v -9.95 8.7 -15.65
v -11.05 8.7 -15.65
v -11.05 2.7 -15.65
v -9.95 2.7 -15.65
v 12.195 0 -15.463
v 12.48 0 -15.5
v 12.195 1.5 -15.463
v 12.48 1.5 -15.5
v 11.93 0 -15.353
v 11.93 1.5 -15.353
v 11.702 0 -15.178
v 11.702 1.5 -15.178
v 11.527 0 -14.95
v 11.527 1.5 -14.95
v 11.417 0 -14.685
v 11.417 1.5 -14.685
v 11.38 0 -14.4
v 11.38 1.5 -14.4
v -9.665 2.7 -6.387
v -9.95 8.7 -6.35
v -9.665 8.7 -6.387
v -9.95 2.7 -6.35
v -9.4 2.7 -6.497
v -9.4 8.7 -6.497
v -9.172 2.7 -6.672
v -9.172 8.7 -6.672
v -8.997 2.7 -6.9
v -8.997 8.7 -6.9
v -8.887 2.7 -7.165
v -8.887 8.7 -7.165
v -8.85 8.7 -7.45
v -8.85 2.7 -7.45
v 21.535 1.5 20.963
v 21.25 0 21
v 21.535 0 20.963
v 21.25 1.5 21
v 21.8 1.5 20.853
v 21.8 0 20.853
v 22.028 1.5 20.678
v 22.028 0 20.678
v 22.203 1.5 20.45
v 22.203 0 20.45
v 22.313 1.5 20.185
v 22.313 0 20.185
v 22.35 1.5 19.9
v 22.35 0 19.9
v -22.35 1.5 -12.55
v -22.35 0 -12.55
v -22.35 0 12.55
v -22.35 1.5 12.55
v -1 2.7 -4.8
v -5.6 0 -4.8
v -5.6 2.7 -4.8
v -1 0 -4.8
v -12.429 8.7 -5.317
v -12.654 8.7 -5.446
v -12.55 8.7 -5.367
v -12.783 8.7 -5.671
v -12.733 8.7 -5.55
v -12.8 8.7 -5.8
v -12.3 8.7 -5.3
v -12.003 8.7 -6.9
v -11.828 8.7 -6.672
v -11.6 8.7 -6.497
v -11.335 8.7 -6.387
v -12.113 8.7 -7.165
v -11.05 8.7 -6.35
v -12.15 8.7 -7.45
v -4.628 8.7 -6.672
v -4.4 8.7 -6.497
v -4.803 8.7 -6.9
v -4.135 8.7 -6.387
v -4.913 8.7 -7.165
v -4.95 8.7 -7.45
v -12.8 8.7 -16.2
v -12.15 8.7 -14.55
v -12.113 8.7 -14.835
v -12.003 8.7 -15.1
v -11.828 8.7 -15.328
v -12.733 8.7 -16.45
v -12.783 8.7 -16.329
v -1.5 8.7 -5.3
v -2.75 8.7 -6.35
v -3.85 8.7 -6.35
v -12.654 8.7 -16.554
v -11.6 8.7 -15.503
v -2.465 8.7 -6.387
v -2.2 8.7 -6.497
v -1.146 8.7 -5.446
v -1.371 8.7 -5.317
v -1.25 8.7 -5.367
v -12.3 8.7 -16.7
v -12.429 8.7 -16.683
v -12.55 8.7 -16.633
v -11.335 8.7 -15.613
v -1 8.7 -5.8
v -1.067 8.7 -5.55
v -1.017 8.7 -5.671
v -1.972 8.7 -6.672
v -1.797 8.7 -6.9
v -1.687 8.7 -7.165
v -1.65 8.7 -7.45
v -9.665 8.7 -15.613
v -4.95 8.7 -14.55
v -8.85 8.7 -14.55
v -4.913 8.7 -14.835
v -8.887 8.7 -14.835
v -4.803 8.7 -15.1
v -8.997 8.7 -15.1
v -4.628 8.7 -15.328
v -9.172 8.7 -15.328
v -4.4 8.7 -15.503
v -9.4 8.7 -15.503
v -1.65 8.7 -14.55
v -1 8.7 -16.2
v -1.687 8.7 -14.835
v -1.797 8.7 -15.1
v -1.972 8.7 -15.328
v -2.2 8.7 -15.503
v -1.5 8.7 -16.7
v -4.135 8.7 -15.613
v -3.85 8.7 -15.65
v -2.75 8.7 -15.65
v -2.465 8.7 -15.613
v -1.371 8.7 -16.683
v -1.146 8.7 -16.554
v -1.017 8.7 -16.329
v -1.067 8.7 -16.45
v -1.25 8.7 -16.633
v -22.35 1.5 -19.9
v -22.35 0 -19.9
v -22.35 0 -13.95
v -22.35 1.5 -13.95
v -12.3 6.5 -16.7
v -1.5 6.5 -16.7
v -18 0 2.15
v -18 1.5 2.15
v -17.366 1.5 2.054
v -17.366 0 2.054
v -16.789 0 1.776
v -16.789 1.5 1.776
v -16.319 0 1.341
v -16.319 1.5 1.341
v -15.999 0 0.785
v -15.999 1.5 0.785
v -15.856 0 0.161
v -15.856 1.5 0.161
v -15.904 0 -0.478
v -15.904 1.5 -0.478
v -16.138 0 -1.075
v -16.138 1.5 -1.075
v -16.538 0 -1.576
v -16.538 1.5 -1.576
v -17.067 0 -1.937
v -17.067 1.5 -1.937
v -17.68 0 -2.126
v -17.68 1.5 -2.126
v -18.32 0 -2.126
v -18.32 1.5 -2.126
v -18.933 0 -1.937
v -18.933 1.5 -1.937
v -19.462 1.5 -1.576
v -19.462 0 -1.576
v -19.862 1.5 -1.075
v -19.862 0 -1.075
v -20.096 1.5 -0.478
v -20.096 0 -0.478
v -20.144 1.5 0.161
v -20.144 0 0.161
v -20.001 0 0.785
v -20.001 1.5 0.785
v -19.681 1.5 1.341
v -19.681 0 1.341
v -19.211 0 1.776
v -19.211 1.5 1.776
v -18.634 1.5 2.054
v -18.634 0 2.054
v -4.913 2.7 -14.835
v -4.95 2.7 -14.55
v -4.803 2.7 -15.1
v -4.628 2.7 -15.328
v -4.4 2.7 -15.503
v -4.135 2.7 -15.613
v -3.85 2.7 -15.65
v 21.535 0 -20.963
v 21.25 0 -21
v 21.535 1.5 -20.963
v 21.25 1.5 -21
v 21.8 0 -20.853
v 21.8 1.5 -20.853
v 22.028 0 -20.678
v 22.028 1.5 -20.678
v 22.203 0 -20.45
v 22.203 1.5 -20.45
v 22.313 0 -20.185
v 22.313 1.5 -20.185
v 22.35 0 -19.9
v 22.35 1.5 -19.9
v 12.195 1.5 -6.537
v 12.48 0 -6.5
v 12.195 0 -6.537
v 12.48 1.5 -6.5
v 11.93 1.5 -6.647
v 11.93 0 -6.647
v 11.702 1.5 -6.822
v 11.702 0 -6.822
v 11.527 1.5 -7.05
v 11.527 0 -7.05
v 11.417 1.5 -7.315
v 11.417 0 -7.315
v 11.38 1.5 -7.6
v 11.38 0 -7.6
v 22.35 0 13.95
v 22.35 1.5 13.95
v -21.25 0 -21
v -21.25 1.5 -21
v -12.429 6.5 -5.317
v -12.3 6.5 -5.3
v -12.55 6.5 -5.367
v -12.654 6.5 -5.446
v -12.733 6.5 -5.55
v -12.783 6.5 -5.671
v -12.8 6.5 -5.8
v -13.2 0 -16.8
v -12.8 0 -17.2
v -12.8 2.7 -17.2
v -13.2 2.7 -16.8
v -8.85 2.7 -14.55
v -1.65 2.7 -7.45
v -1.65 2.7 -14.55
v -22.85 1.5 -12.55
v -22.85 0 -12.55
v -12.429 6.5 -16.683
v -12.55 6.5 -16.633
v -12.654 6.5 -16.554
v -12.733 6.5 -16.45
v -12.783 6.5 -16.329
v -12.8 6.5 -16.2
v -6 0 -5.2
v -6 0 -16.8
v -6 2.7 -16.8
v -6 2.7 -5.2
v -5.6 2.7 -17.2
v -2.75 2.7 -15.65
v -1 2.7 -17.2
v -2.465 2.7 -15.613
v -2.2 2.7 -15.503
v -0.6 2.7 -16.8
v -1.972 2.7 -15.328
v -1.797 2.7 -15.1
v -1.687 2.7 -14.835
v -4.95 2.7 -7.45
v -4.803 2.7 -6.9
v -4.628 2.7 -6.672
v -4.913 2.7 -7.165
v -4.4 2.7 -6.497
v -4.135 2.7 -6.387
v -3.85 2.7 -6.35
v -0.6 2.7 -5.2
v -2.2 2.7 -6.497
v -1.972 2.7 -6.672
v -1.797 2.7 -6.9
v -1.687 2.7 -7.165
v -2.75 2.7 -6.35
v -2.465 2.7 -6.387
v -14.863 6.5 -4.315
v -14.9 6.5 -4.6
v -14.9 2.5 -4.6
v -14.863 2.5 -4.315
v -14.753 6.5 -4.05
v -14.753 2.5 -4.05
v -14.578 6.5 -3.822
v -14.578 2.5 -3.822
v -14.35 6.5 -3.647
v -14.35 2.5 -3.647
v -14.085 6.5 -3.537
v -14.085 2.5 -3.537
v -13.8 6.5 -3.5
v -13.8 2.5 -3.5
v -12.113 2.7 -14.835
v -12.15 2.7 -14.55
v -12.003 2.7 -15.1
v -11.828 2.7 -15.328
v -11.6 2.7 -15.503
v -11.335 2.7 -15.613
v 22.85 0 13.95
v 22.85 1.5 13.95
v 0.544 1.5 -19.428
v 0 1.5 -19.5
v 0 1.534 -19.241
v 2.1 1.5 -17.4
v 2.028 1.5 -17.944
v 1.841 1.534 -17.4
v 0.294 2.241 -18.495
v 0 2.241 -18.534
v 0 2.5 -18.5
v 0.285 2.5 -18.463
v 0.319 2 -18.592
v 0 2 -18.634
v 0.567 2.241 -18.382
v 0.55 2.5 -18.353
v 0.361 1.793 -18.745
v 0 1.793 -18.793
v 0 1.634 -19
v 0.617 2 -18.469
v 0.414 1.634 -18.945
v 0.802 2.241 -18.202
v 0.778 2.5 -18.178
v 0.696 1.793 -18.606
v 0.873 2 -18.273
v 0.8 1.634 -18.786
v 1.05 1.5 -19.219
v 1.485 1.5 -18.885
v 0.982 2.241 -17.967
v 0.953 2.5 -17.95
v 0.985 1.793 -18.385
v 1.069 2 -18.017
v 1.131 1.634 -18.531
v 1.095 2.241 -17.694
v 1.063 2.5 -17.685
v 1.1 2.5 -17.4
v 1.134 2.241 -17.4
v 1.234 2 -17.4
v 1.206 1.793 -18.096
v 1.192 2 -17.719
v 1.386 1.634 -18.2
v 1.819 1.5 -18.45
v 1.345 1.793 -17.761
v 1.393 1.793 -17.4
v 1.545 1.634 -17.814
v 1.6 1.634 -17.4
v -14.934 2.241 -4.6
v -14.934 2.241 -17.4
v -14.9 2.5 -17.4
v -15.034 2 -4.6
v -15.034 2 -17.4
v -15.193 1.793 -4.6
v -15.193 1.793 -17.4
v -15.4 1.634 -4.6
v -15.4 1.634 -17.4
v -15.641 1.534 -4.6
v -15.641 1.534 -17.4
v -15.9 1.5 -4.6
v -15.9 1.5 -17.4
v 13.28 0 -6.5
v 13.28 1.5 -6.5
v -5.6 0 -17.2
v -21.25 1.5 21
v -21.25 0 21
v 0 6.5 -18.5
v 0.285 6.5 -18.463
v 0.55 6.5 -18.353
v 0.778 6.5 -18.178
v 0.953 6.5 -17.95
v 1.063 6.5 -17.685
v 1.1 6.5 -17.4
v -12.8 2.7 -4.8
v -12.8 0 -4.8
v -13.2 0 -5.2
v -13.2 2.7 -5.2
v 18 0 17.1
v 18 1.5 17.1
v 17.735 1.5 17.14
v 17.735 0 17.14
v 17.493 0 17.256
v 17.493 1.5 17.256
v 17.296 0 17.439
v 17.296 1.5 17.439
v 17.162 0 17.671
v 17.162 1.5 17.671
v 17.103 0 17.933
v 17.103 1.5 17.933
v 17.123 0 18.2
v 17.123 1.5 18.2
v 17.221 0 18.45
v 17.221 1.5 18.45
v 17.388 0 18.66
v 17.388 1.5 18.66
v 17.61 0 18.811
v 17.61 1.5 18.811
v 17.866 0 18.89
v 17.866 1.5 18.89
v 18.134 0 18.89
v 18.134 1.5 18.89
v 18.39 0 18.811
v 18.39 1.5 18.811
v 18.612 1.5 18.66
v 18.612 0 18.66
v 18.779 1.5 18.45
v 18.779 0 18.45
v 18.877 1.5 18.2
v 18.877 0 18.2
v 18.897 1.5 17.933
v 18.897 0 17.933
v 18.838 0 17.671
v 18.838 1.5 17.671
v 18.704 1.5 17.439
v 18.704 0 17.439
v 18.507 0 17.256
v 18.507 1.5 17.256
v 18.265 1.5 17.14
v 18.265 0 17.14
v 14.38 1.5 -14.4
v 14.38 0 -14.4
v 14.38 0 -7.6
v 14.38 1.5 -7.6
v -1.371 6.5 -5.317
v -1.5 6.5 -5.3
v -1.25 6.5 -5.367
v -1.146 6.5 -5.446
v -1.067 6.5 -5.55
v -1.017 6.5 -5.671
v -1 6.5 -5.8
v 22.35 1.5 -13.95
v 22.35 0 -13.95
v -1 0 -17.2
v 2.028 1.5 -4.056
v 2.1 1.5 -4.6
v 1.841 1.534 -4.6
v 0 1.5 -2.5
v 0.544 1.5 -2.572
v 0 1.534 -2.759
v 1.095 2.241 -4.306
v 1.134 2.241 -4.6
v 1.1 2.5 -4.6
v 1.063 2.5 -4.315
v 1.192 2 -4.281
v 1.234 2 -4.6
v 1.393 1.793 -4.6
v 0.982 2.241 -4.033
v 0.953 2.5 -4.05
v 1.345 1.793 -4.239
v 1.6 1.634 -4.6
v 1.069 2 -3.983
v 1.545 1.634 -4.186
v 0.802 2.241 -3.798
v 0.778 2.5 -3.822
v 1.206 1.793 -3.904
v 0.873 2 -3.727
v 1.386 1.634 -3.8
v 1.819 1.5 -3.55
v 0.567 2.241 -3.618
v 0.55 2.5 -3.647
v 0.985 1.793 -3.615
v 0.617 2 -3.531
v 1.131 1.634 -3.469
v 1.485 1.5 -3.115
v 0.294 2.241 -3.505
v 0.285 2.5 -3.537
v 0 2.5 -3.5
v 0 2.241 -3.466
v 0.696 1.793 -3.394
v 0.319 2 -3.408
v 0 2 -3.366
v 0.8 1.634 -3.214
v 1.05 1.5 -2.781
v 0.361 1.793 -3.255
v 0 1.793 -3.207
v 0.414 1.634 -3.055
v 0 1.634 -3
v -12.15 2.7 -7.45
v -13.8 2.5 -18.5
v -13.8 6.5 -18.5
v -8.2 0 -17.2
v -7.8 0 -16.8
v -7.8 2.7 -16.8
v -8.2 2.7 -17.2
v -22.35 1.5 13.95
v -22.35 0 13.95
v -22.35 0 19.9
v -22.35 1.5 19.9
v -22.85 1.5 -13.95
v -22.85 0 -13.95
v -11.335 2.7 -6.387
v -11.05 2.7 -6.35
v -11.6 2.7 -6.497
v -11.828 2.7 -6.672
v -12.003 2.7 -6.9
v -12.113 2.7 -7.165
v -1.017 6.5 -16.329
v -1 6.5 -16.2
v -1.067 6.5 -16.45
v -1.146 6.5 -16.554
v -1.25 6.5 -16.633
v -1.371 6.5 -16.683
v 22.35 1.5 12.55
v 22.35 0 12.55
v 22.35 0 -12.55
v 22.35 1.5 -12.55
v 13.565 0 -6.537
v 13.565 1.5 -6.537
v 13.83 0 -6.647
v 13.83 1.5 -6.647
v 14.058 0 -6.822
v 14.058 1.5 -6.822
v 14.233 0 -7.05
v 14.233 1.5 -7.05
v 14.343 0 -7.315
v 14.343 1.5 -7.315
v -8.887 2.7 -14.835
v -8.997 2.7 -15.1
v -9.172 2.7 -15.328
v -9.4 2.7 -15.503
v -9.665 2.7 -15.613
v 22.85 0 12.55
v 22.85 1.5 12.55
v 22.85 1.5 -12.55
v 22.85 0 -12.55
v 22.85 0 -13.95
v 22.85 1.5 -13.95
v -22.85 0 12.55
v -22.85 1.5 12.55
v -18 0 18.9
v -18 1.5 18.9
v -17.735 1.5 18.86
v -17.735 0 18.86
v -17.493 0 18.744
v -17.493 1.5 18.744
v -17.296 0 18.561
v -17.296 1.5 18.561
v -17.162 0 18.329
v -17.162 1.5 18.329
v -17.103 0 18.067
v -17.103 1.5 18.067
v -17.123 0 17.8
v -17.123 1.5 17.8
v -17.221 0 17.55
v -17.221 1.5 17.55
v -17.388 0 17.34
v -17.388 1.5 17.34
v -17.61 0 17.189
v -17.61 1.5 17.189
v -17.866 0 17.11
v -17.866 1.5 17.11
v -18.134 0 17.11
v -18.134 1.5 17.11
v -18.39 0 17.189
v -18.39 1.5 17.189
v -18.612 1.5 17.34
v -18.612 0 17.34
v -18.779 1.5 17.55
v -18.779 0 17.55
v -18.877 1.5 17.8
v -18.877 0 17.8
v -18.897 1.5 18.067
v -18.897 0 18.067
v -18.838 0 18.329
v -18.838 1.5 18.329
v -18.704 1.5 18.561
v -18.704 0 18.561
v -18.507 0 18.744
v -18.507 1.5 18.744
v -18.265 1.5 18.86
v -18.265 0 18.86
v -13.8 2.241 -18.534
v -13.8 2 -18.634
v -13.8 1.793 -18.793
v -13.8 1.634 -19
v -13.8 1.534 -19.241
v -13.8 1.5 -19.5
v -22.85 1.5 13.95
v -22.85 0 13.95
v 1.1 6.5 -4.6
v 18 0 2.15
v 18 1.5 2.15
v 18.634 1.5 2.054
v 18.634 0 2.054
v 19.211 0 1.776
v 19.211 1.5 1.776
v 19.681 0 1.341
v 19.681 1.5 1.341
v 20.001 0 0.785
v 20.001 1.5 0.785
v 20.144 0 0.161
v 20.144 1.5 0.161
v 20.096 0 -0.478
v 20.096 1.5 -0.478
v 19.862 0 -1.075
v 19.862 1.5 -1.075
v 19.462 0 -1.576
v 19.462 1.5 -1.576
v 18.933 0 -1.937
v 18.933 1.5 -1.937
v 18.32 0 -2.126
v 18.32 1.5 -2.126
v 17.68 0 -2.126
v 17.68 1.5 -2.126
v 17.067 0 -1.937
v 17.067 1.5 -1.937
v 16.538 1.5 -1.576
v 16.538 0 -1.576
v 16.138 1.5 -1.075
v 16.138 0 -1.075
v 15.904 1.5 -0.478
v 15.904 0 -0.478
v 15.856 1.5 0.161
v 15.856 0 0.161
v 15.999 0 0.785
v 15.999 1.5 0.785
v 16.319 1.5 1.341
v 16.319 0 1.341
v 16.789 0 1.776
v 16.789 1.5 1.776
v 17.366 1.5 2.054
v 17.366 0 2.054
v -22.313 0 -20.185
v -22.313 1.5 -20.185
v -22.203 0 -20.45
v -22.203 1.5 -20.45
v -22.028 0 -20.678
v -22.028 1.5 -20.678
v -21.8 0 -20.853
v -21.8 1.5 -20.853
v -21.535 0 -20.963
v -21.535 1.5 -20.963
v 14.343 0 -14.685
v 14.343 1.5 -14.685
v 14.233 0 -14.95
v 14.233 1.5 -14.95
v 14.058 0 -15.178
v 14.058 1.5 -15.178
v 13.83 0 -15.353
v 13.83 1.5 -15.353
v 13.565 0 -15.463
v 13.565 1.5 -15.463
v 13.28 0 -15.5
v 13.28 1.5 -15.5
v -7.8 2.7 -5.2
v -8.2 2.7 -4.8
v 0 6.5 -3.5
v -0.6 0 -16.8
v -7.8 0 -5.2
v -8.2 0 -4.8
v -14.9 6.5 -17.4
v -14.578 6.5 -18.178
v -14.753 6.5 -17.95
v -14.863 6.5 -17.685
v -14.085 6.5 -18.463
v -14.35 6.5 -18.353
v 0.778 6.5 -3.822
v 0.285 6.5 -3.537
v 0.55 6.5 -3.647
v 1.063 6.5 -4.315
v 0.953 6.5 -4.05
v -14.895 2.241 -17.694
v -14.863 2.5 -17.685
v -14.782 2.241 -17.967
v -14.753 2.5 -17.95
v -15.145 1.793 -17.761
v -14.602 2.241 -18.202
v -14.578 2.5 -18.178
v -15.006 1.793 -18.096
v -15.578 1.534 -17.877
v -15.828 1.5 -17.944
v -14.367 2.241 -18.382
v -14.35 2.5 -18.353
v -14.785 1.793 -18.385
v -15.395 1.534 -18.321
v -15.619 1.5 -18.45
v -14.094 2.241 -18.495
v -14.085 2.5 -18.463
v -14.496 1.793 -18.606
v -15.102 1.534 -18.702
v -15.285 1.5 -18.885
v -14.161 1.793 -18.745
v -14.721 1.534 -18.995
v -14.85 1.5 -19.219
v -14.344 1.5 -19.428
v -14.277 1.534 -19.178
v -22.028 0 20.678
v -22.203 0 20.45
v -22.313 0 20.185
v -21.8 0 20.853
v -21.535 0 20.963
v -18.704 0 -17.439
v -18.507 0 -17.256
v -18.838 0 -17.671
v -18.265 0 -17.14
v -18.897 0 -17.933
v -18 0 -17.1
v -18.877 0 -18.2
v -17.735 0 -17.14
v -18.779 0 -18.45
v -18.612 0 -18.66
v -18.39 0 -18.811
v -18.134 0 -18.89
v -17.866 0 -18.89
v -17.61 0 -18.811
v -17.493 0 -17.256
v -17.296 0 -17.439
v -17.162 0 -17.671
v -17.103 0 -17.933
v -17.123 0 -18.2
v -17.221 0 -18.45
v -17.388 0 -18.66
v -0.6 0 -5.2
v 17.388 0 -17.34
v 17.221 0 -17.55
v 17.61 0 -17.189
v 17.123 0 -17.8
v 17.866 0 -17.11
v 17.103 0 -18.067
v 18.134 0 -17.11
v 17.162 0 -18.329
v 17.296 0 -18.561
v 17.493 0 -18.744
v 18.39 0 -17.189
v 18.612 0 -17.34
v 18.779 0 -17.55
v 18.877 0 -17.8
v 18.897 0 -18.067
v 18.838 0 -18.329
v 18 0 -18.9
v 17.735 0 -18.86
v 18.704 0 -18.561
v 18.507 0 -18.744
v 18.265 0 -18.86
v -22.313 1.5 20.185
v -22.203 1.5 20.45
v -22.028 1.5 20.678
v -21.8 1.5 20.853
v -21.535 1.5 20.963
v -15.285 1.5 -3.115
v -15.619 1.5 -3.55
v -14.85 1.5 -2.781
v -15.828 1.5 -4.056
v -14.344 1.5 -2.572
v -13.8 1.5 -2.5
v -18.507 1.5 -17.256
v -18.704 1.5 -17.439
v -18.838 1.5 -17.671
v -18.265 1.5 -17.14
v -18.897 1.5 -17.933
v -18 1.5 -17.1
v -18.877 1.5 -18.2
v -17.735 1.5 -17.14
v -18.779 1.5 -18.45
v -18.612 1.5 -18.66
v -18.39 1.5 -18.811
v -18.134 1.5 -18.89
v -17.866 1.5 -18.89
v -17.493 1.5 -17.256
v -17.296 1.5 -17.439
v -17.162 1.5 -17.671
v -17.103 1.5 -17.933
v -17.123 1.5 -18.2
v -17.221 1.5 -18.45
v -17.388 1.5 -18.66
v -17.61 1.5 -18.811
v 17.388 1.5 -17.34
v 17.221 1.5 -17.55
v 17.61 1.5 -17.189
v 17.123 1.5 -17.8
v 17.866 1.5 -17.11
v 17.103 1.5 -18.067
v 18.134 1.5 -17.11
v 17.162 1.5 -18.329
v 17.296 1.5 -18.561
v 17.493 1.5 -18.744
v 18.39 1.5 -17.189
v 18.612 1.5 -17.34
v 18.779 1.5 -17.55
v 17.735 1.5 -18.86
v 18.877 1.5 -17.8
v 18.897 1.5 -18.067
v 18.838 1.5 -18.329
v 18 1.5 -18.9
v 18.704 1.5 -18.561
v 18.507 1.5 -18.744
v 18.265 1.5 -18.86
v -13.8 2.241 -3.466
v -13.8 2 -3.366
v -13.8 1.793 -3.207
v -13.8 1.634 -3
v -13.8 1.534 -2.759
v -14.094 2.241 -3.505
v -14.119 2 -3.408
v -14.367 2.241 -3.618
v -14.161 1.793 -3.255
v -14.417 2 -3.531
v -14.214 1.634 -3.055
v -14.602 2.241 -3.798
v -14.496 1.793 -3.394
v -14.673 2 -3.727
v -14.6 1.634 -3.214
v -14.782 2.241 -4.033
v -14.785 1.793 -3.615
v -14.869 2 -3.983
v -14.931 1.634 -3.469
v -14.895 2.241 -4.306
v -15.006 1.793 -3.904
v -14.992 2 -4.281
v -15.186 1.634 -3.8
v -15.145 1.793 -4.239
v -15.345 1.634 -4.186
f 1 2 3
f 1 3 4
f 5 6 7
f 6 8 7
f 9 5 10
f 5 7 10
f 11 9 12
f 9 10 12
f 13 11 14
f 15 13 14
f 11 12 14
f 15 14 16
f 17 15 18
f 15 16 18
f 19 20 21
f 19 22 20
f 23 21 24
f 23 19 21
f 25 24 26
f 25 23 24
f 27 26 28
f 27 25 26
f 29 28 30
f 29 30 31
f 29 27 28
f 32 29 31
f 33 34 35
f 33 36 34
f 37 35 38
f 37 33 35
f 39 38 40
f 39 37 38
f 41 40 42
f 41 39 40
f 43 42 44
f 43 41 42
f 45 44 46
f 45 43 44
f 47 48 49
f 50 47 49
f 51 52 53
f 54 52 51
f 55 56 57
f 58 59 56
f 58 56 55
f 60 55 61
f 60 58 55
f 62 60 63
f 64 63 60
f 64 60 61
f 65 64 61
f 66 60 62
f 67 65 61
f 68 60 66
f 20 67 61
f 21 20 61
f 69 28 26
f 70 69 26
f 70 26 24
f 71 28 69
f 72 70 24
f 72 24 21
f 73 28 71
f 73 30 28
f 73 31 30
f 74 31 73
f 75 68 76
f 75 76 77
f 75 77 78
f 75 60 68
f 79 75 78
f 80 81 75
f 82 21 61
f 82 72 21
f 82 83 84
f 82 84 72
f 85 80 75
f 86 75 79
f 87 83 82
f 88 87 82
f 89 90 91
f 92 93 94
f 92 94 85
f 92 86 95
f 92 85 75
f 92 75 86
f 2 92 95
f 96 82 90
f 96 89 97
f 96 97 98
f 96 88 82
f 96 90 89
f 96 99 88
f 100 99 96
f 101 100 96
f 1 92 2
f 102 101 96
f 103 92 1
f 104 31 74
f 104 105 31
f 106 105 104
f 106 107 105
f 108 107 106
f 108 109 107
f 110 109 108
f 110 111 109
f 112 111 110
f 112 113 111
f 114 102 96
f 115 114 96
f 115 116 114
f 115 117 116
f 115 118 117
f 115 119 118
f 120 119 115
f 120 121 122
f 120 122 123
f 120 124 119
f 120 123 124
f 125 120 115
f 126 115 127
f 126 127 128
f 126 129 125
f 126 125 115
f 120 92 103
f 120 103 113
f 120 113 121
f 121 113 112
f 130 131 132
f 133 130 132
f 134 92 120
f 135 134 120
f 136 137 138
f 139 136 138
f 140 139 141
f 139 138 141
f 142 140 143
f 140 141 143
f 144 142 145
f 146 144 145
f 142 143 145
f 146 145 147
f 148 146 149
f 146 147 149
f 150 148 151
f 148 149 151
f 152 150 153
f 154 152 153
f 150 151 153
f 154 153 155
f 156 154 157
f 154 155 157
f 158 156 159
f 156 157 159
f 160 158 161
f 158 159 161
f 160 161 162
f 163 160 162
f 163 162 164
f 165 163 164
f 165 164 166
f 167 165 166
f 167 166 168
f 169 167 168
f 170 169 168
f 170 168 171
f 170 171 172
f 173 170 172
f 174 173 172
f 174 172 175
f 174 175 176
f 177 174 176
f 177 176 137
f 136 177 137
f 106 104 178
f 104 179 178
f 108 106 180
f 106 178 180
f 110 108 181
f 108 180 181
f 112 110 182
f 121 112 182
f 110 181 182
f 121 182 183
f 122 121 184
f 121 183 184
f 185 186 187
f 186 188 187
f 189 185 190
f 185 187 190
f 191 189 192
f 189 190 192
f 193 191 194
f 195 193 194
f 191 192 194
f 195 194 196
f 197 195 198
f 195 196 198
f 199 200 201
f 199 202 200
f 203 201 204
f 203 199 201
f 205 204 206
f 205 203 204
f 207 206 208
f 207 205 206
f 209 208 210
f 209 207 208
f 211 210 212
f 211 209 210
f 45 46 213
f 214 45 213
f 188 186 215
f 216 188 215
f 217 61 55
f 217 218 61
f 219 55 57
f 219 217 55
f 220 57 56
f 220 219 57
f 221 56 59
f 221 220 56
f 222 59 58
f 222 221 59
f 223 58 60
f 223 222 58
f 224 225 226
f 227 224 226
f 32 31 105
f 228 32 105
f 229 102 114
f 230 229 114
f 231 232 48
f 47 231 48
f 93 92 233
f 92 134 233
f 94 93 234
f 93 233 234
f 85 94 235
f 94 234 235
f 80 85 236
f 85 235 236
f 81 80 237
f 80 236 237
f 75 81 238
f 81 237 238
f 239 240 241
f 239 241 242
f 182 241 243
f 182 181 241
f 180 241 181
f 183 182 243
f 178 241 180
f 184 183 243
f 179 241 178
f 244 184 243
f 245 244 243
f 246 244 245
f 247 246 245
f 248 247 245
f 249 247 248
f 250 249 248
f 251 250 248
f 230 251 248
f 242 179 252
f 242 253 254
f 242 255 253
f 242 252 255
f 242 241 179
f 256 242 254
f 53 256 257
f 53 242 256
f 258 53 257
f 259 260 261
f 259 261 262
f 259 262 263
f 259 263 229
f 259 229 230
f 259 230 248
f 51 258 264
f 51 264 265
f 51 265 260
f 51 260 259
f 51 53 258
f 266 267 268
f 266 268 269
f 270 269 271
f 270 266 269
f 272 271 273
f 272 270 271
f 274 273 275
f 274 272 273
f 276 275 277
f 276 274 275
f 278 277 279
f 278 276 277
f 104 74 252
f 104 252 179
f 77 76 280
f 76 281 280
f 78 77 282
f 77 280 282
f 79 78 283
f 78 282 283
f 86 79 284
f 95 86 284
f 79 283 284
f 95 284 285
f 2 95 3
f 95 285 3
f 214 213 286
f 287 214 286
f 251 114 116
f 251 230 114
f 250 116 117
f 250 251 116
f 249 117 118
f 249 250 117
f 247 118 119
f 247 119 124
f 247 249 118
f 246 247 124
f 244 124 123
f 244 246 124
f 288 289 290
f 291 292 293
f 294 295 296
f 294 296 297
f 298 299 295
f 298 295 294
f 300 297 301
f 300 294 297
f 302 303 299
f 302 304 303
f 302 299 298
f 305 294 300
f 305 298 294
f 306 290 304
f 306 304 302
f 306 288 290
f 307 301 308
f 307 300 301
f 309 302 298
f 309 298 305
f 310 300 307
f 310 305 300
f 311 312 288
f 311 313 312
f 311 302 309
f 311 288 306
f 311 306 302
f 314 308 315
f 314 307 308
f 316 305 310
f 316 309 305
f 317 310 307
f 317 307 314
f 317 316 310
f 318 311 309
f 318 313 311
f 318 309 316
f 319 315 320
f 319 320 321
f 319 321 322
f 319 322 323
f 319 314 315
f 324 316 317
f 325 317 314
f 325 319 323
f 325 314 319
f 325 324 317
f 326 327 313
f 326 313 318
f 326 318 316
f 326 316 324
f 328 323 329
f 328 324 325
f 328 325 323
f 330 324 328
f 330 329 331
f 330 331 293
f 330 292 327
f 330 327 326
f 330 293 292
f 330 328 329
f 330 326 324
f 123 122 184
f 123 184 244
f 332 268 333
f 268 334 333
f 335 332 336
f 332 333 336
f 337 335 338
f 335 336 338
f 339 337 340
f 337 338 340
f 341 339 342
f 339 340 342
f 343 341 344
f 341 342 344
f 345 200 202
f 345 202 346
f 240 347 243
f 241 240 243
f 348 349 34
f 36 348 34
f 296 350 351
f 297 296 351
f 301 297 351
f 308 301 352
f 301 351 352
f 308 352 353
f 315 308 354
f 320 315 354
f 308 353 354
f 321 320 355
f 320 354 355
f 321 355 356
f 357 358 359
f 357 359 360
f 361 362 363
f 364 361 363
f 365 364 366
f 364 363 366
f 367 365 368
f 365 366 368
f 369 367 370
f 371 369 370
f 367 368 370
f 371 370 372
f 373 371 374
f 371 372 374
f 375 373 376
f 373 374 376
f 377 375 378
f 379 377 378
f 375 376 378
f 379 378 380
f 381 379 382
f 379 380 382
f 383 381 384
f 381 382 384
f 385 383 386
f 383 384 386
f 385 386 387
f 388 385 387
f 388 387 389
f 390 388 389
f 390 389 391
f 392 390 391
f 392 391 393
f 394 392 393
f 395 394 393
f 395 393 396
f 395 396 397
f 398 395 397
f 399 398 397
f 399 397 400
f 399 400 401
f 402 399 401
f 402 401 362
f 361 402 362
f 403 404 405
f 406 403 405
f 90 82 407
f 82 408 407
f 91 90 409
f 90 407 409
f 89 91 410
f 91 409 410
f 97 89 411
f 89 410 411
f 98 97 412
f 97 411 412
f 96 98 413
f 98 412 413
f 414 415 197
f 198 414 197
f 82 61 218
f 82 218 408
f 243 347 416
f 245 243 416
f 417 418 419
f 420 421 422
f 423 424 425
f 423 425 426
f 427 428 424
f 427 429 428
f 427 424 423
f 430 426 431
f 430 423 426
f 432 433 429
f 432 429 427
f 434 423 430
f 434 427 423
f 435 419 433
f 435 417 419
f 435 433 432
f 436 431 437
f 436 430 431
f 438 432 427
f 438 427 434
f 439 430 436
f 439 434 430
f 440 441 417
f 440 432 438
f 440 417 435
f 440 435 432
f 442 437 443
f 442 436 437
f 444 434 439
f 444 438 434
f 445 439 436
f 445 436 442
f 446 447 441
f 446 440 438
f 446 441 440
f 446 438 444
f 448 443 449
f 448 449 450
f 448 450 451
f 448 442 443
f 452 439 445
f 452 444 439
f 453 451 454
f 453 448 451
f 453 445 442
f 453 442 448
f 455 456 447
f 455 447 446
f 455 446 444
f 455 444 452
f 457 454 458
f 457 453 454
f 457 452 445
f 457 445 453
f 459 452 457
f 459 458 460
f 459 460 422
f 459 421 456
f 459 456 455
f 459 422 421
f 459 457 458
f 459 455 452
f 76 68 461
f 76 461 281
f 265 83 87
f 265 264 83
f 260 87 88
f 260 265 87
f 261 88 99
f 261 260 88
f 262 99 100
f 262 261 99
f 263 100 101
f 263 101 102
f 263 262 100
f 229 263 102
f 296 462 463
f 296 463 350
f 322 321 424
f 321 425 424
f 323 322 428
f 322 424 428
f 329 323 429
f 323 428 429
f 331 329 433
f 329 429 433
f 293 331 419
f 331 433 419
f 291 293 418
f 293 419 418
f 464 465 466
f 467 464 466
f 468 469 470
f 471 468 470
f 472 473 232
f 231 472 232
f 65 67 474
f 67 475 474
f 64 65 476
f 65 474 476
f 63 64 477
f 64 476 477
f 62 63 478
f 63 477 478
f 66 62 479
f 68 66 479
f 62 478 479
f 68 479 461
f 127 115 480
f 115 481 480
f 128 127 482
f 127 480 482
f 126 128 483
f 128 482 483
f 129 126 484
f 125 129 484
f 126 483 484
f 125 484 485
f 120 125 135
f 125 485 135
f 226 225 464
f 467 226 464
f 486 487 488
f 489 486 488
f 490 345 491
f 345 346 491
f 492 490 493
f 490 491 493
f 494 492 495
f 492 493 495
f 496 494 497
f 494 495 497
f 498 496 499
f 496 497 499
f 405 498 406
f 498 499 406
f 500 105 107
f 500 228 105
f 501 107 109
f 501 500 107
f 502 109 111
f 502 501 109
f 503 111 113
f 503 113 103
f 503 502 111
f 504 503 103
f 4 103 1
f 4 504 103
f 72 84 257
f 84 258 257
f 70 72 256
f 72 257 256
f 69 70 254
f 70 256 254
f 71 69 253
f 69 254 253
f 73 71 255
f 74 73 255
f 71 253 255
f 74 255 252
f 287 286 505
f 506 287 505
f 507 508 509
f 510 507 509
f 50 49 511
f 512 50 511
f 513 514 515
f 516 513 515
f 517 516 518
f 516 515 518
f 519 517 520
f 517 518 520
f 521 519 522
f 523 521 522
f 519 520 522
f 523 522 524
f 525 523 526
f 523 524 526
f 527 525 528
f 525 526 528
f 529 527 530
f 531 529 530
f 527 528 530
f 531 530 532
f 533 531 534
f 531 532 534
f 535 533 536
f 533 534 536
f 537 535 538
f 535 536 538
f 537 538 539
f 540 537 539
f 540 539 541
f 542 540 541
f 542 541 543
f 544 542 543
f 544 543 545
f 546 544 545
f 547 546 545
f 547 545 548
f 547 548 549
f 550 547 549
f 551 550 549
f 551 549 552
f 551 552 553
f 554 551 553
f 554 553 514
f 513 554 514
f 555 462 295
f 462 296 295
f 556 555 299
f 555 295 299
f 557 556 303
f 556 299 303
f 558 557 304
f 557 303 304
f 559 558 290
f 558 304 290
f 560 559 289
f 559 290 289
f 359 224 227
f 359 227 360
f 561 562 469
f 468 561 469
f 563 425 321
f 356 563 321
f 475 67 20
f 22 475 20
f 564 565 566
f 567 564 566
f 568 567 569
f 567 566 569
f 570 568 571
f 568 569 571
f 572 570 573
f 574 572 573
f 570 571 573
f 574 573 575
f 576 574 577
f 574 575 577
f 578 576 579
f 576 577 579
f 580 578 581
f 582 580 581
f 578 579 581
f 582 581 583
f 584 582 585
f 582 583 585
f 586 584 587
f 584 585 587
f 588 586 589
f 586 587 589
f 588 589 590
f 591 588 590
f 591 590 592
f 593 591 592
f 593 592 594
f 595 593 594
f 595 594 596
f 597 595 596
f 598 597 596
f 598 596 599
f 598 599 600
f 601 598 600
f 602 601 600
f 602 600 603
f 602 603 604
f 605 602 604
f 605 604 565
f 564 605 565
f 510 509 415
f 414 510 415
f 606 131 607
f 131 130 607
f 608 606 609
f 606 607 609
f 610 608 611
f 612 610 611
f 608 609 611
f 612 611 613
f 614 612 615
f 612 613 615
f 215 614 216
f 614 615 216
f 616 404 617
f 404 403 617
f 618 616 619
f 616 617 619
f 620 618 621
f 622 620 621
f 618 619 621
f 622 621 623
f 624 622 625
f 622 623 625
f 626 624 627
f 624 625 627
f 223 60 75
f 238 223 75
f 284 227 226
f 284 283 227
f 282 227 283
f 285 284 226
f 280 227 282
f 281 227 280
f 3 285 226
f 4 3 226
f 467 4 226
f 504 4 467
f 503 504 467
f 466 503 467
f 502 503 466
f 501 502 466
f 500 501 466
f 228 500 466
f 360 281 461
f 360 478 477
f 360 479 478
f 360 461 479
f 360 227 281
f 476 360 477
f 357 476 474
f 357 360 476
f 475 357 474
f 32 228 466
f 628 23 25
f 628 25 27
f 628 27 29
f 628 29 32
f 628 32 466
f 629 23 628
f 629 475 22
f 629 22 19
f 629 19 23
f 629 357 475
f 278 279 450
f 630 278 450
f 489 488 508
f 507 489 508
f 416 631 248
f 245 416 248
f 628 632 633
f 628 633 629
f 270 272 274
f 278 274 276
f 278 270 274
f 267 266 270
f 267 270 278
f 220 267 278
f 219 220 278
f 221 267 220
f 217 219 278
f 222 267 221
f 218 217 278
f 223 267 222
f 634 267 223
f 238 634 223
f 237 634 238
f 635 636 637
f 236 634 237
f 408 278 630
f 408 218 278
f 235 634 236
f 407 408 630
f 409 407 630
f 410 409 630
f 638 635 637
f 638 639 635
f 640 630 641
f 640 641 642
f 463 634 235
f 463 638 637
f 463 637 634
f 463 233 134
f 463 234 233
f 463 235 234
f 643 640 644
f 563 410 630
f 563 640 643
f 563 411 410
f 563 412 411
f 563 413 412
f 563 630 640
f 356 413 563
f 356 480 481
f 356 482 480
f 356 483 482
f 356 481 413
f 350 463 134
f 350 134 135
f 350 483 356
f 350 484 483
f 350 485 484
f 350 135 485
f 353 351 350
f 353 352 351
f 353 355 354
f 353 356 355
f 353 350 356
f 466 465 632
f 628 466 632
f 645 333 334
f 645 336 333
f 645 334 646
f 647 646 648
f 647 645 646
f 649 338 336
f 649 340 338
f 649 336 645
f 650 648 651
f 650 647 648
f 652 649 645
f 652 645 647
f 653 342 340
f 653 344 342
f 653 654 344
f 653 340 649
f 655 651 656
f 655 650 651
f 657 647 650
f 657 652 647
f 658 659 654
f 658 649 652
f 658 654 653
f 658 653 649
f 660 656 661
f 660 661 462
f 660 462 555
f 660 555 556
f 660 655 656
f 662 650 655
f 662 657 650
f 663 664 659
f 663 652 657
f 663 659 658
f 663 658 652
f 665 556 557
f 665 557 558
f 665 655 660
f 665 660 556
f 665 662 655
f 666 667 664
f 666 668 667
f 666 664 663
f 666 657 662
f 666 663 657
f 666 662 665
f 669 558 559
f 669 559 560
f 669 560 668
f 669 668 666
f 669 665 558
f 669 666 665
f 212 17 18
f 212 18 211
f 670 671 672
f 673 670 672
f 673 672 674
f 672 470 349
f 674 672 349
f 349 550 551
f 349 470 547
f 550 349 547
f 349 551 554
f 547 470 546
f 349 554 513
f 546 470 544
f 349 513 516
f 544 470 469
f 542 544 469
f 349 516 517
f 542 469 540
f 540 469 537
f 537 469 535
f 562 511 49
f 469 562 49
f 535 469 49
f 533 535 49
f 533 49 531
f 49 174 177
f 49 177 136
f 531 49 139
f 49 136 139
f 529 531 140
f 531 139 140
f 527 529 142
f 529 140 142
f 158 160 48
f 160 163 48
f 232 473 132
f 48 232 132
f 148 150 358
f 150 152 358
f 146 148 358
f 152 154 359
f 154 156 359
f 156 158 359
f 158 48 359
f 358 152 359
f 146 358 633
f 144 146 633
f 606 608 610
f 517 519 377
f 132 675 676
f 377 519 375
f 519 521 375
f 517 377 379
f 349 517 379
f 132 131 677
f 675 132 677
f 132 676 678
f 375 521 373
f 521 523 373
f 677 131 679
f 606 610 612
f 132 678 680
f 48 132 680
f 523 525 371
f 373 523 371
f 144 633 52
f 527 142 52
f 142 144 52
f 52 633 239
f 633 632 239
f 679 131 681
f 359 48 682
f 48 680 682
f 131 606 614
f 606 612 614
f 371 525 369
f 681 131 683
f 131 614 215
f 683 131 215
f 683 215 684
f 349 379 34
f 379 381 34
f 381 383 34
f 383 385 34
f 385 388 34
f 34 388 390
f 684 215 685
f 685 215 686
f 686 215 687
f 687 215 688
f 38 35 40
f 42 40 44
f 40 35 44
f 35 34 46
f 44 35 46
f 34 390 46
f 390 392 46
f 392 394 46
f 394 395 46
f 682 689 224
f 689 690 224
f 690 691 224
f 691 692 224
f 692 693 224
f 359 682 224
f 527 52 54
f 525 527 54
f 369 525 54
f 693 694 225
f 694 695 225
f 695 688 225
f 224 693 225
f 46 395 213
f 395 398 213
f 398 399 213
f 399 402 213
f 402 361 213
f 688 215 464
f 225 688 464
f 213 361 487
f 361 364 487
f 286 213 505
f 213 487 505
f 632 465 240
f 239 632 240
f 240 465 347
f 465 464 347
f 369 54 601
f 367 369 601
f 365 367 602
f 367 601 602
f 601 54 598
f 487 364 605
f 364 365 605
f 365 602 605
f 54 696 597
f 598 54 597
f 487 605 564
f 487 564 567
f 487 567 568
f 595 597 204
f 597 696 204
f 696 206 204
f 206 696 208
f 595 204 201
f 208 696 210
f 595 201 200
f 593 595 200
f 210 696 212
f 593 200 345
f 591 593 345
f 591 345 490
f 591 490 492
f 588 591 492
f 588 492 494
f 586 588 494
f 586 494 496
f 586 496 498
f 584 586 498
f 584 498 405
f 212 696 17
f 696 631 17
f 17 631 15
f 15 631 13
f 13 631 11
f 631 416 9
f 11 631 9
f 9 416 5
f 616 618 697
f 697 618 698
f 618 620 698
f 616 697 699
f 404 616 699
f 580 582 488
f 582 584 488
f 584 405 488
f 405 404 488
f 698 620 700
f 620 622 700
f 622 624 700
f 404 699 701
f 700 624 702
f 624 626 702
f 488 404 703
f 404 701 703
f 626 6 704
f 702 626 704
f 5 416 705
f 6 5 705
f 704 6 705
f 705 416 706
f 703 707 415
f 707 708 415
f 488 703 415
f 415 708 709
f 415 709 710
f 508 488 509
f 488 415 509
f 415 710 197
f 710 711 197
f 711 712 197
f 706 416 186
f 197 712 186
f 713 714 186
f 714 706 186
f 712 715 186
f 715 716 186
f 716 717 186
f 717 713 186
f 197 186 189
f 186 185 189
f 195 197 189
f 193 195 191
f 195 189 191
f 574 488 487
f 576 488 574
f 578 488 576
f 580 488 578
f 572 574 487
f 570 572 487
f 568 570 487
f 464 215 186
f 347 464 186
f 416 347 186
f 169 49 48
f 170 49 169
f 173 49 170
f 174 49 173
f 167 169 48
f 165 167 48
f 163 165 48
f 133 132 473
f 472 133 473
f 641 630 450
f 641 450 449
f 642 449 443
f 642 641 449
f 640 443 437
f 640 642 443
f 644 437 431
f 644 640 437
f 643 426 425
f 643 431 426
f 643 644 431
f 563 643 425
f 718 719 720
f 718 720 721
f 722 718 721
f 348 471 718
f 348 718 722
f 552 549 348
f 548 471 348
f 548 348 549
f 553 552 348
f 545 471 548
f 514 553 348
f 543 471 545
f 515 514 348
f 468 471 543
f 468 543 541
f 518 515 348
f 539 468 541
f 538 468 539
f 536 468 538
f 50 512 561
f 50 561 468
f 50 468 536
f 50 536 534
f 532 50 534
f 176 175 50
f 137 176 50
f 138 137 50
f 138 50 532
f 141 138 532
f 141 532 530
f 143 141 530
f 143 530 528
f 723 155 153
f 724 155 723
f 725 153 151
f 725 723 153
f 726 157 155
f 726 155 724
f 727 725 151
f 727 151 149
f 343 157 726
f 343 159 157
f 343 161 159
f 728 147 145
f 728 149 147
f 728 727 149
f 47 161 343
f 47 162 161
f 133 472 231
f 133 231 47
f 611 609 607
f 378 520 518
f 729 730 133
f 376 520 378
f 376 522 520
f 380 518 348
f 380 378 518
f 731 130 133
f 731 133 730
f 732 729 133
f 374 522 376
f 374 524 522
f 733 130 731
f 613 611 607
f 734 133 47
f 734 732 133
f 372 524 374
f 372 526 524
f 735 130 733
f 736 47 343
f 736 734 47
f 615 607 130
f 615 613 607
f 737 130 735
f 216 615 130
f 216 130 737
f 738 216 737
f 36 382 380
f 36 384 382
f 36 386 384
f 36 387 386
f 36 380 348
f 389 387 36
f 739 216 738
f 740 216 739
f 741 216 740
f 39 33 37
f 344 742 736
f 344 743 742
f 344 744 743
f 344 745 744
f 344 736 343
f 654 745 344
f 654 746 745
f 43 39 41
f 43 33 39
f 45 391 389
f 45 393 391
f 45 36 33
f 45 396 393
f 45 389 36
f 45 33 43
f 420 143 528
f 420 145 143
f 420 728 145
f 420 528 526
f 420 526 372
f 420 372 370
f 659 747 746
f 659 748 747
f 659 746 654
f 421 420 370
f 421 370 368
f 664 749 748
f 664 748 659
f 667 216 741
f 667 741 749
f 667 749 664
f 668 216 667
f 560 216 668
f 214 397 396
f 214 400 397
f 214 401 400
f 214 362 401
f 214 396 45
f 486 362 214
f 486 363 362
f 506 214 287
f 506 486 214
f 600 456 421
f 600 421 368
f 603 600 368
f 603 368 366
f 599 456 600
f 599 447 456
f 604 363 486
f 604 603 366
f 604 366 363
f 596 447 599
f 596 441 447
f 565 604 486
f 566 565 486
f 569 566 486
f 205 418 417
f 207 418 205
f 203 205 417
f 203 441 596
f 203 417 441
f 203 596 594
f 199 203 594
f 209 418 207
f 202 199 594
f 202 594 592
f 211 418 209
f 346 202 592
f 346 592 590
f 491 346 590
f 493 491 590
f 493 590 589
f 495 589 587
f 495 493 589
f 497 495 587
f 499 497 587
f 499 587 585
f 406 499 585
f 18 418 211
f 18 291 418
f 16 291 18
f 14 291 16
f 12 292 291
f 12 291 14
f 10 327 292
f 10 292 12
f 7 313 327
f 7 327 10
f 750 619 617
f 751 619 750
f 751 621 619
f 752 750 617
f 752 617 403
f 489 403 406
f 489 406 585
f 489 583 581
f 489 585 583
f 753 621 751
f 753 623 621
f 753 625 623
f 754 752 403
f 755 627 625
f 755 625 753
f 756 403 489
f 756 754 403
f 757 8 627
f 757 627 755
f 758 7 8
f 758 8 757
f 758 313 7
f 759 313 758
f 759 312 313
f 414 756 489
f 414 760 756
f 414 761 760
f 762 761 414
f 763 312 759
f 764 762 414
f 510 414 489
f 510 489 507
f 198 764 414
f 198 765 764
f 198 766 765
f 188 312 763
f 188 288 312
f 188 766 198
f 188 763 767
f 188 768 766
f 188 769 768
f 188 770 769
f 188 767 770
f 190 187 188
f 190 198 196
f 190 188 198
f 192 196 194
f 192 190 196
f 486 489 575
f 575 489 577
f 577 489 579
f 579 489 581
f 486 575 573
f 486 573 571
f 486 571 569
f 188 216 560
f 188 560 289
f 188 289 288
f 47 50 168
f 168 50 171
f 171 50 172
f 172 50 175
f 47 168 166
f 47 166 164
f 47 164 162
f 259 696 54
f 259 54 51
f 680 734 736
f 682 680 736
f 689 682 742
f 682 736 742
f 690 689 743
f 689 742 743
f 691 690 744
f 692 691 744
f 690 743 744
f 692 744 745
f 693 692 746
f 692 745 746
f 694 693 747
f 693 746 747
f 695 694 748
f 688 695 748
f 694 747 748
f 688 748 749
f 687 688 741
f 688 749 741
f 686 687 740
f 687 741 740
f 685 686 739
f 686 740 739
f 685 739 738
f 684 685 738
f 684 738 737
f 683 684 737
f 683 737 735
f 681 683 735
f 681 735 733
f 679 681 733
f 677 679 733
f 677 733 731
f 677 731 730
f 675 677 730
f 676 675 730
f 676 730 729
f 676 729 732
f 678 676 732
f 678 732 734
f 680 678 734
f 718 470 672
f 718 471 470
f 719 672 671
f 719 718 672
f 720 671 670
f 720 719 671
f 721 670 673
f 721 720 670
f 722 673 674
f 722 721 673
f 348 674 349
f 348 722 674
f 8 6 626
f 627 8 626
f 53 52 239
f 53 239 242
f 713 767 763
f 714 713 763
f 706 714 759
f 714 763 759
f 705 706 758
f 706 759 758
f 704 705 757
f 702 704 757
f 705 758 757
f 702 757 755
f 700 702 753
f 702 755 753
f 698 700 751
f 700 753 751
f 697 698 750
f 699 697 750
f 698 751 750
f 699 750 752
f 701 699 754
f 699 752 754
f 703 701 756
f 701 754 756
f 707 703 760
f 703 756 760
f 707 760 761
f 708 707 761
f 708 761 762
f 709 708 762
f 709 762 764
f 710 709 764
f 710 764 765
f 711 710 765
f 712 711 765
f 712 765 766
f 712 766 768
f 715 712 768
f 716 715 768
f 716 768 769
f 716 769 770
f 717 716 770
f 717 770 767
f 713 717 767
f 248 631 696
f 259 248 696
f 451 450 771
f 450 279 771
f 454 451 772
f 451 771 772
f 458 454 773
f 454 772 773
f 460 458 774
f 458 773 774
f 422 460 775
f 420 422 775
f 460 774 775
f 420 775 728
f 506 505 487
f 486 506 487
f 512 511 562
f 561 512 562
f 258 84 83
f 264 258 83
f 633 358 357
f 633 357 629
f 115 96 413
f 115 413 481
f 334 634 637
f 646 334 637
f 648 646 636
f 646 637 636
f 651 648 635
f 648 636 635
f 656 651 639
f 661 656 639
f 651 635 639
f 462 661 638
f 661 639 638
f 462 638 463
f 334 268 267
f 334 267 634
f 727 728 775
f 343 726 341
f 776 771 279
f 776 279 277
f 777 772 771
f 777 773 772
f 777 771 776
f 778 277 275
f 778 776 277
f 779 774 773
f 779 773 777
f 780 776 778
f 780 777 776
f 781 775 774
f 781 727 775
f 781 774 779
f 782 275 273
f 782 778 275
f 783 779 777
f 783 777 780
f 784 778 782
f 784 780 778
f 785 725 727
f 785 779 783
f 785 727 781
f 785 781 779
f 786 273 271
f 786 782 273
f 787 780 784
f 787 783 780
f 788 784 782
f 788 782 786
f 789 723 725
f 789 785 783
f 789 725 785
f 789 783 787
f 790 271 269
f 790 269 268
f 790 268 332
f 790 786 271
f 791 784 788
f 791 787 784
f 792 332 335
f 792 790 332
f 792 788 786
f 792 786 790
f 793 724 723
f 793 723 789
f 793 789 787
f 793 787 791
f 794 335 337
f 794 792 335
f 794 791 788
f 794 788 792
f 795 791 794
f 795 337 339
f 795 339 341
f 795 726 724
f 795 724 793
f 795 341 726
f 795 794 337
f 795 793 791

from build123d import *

# Parameters (mm, degrees)
EXTRUDE_1_DEPTH     = 1.5
SKETCH_2_R          = 2.15
SKETCH_2_R_2        = 0.9
CUT_EXTRUDE_1_DEPTH = 32.070444155
SKETCH_3_W          = 12.2
SKETCH_3_H          = 12
EXTRUDE_2_DEPTH     = 7.2
SKETCH_4_W          = 16
SKETCH_4_H          = 15
EXTRUDE_3_DEPTH     = 7.2
SKETCH_5_W          = 3.3
SKETCH_5_H          = 9.3
CUT_EXTRUDE_2_DEPTH = 33.230614329
SKETCH_6_W          = 5.4
SKETCH_6_H          = 12.4
CUT_EXTRUDE_3_DEPTH = 2.7
SKETCH_7_W          = 3
SKETCH_7_H          = 9
CUT_EXTRUDE_4_DEPTH = 33.230614329
SKETCH_8_W          = 16
SKETCH_8_H          = 15
SKETCH_8_W_2        = 11.8
SKETCH_8_H_2        = 11.4
CUT_EXTRUDE_5_DEPTH = 2.2
FILLET_1_R          = 1.1
FILLET_2_R          = 0.5
FILLET_3_R          = 1
CHAMFER_1_SIZE      = 0.4


with BuildPart() as part:
    # 草图1 → 凸台-拉伸1 (new body)
    with BuildSketch(Plane(origin=(0, 0, 0), x_dir=(1, 0, 0), z_dir=(0, 1, 0))):
        Polygon((-22.35, -12.55), (-22.85, -12.55), (-22.85, -13.95), (-22.35, -13.95), (-22.35, -21), (22.35, -21), (22.35, -13.95), (22.85, -13.95), (22.85, -12.55), (22.35, -12.55), (22.35, 12.55), (22.85, 12.55), (22.85, 13.95), (22.35, 13.95), (22.35, 21), (-22.35, 21), (-22.35, 13.95), (-22.85, 13.95), (-22.85, 12.55), (-22.35, 12.55), align=None)
    extrude(amount=EXTRUDE_1_DEPTH)

    # 草图2 → 切除-拉伸1 (cut, through all)
    with BuildSketch(Plane(origin=(0, 1.5, 0), x_dir=(1, 0, 0), z_dir=(0, 1, 0))):
        with Locations(Location((-18, 0, 0), (0, 0, 270))):
            Circle(SKETCH_2_R)
        with Locations(Location((18, 0, 0), (0, 0, 270))):
            Circle(SKETCH_2_R)
        with Locations(Location((-18, -18, 0), (0, 0, 270))):
            Circle(SKETCH_2_R_2)
        with Locations(Location((-18, 18, 0), (0, 0, 270))):
            Circle(SKETCH_2_R_2)
        with Locations(Location((18, -18, 0), (0, 0, 90))):
            Circle(SKETCH_2_R_2)
        with Locations(Location((18, 18, 0), (0, 0, 90))):
            Circle(SKETCH_2_R_2)
    extrude(amount=-CUT_EXTRUDE_1_DEPTH, mode=Mode.SUBTRACT)

    # 草图3 → 凸台-拉伸2 (add)
    with BuildSketch(Plane(origin=(0, 1.5, 0), x_dir=(1, 0, 0), z_dir=(0, 1, 0))):
        with Locations((-6.9, 11)):
            Rectangle(SKETCH_3_W, SKETCH_3_H)
    extrude(amount=EXTRUDE_2_DEPTH)

    # 草图4 → 凸台-拉伸3 (add)
    with BuildSketch(Plane(origin=(0, 1.5, 0), x_dir=(1, 0, 0), z_dir=(0, 1, 0))):
        with Locations((-6.9, 11)):
            Rectangle(SKETCH_4_W, SKETCH_4_H)
    extrude(amount=EXTRUDE_3_DEPTH)

    # 草图5 → 切除-拉伸2 (cut, through all)
    with BuildSketch(Plane(origin=(0, 8.7, 0), x_dir=(1, 0, 0), z_dir=(0, 1, 0))):
        with Locations((-10.5, 11)):
            Rectangle(SKETCH_5_W, SKETCH_5_H)
        with Locations((-3.3, 11)):
            Rectangle(SKETCH_5_W, SKETCH_5_H)
    extrude(amount=-CUT_EXTRUDE_2_DEPTH, mode=Mode.SUBTRACT)

    # 草图6 → 切除-拉伸3 (cut)
    with BuildSketch(Plane.XZ):
        with Locations((-10.5, -11)):
            Rectangle(SKETCH_6_W, SKETCH_6_H)
        with Locations((-3.3, -11)):
            Rectangle(SKETCH_6_W, SKETCH_6_H)
    extrude(amount=-CUT_EXTRUDE_3_DEPTH, mode=Mode.SUBTRACT)

    # 草图7 → 切除-拉伸4 (cut, through all)
    with BuildSketch(Plane.XZ):
        with Locations((12.88, -11)):
            Rectangle(SKETCH_7_W, SKETCH_7_H)
    extrude(amount=-CUT_EXTRUDE_4_DEPTH, mode=Mode.SUBTRACT)

    # 草图8 → 切除-拉伸5 (cut)
    with BuildSketch(Plane(origin=(0, 8.7, 0), x_dir=(1, 0, 0), z_dir=(0, 1, 0))):
        with Locations((-6.9, 11)):
            Rectangle(SKETCH_8_W, SKETCH_8_H)
        with Locations((-6.9, 11)):
            Rectangle(SKETCH_8_W_2, SKETCH_8_H_2, mode=Mode.SUBTRACT)
    extrude(amount=-CUT_EXTRUDE_5_DEPTH, mode=Mode.SUBTRACT)

    # 圆角1
    fillet_1_edges = [part.edges().sort_by_distance(p)[0] for p in [
        (-12.15, 5.7, -15.65),
        (-8.85, 5.7, -15.65),
        (-12.15, 5.7, -6.35),
        (-8.85, 5.7, -6.35),
        (-4.95, 5.7, -15.65),
        (-1.65, 5.7, -15.65),
        (-4.95, 5.7, -6.35),
        (-1.65, 5.7, -6.35),
        (14.38, 0.75, -6.5),
        (14.38, 0.75, -15.5),
        (11.38, 0.75, -15.5),
        (11.38, 0.75, -6.5),
        (-14.9, 4, -3.5),
        (1.1, 4, -3.5),
        (-14.9, 4, -18.5),
        (1.1, 4, -18.5),
        (22.35, 0.75, 21),
        (-22.35, 0.75, 21),
        (-22.35, 0.75, -21),
        (22.35, 0.75, -21),
    ]]
    fillet(fillet_1_edges, radius=FILLET_1_R)

    # 圆角2
    fillet_2_edges = [part.edges().sort_by_distance(p)[0] for p in [
        (-1, 7.6, -5.3),
        (-12.8, 7.6, -5.3),
        (-12.8, 7.6, -16.7),
        (-1, 7.6, -16.7),
    ]]
    fillet(fillet_2_edges, radius=FILLET_2_R)

    # 圆角3
    fillet_3_edges = [part.edges().sort_by_distance(p)[0] for p in [
        (-6.9, 1.5, -18.5),
        (1.1, 1.5, -11),
        (-6.9, 1.5, -3.5),
        (-14.9, 1.5, -11),
        (-14.577817459, 1.5, -3.822182541),
        (-14.577817459, 1.5, -18.177817459),
        (0.777817459, 1.5, -18.177817459),
        (0.777817459, 1.5, -3.822182541),
    ]]
    fillet(fillet_3_edges, radius=FILLET_3_R)

    # 倒角1
    chamfer_1_edges = [part.edges().sort_by_distance(p)[0] for p in [
        (-7.8, 1.35, -4.8),
        (-7.8, 1.35, -17.2),
        (-13.2, 1.35, -17.2),
        (-13.2, 1.35, -4.8),
        (-0.6, 1.35, -4.8),
        (-0.6, 1.35, -17.2),
        (-6, 1.35, -17.2),
        (-6, 1.35, -4.8),
    ]]
    chamfer(chamfer_1_edges, length=CHAMFER_1_SIZE)


solid = part.part
